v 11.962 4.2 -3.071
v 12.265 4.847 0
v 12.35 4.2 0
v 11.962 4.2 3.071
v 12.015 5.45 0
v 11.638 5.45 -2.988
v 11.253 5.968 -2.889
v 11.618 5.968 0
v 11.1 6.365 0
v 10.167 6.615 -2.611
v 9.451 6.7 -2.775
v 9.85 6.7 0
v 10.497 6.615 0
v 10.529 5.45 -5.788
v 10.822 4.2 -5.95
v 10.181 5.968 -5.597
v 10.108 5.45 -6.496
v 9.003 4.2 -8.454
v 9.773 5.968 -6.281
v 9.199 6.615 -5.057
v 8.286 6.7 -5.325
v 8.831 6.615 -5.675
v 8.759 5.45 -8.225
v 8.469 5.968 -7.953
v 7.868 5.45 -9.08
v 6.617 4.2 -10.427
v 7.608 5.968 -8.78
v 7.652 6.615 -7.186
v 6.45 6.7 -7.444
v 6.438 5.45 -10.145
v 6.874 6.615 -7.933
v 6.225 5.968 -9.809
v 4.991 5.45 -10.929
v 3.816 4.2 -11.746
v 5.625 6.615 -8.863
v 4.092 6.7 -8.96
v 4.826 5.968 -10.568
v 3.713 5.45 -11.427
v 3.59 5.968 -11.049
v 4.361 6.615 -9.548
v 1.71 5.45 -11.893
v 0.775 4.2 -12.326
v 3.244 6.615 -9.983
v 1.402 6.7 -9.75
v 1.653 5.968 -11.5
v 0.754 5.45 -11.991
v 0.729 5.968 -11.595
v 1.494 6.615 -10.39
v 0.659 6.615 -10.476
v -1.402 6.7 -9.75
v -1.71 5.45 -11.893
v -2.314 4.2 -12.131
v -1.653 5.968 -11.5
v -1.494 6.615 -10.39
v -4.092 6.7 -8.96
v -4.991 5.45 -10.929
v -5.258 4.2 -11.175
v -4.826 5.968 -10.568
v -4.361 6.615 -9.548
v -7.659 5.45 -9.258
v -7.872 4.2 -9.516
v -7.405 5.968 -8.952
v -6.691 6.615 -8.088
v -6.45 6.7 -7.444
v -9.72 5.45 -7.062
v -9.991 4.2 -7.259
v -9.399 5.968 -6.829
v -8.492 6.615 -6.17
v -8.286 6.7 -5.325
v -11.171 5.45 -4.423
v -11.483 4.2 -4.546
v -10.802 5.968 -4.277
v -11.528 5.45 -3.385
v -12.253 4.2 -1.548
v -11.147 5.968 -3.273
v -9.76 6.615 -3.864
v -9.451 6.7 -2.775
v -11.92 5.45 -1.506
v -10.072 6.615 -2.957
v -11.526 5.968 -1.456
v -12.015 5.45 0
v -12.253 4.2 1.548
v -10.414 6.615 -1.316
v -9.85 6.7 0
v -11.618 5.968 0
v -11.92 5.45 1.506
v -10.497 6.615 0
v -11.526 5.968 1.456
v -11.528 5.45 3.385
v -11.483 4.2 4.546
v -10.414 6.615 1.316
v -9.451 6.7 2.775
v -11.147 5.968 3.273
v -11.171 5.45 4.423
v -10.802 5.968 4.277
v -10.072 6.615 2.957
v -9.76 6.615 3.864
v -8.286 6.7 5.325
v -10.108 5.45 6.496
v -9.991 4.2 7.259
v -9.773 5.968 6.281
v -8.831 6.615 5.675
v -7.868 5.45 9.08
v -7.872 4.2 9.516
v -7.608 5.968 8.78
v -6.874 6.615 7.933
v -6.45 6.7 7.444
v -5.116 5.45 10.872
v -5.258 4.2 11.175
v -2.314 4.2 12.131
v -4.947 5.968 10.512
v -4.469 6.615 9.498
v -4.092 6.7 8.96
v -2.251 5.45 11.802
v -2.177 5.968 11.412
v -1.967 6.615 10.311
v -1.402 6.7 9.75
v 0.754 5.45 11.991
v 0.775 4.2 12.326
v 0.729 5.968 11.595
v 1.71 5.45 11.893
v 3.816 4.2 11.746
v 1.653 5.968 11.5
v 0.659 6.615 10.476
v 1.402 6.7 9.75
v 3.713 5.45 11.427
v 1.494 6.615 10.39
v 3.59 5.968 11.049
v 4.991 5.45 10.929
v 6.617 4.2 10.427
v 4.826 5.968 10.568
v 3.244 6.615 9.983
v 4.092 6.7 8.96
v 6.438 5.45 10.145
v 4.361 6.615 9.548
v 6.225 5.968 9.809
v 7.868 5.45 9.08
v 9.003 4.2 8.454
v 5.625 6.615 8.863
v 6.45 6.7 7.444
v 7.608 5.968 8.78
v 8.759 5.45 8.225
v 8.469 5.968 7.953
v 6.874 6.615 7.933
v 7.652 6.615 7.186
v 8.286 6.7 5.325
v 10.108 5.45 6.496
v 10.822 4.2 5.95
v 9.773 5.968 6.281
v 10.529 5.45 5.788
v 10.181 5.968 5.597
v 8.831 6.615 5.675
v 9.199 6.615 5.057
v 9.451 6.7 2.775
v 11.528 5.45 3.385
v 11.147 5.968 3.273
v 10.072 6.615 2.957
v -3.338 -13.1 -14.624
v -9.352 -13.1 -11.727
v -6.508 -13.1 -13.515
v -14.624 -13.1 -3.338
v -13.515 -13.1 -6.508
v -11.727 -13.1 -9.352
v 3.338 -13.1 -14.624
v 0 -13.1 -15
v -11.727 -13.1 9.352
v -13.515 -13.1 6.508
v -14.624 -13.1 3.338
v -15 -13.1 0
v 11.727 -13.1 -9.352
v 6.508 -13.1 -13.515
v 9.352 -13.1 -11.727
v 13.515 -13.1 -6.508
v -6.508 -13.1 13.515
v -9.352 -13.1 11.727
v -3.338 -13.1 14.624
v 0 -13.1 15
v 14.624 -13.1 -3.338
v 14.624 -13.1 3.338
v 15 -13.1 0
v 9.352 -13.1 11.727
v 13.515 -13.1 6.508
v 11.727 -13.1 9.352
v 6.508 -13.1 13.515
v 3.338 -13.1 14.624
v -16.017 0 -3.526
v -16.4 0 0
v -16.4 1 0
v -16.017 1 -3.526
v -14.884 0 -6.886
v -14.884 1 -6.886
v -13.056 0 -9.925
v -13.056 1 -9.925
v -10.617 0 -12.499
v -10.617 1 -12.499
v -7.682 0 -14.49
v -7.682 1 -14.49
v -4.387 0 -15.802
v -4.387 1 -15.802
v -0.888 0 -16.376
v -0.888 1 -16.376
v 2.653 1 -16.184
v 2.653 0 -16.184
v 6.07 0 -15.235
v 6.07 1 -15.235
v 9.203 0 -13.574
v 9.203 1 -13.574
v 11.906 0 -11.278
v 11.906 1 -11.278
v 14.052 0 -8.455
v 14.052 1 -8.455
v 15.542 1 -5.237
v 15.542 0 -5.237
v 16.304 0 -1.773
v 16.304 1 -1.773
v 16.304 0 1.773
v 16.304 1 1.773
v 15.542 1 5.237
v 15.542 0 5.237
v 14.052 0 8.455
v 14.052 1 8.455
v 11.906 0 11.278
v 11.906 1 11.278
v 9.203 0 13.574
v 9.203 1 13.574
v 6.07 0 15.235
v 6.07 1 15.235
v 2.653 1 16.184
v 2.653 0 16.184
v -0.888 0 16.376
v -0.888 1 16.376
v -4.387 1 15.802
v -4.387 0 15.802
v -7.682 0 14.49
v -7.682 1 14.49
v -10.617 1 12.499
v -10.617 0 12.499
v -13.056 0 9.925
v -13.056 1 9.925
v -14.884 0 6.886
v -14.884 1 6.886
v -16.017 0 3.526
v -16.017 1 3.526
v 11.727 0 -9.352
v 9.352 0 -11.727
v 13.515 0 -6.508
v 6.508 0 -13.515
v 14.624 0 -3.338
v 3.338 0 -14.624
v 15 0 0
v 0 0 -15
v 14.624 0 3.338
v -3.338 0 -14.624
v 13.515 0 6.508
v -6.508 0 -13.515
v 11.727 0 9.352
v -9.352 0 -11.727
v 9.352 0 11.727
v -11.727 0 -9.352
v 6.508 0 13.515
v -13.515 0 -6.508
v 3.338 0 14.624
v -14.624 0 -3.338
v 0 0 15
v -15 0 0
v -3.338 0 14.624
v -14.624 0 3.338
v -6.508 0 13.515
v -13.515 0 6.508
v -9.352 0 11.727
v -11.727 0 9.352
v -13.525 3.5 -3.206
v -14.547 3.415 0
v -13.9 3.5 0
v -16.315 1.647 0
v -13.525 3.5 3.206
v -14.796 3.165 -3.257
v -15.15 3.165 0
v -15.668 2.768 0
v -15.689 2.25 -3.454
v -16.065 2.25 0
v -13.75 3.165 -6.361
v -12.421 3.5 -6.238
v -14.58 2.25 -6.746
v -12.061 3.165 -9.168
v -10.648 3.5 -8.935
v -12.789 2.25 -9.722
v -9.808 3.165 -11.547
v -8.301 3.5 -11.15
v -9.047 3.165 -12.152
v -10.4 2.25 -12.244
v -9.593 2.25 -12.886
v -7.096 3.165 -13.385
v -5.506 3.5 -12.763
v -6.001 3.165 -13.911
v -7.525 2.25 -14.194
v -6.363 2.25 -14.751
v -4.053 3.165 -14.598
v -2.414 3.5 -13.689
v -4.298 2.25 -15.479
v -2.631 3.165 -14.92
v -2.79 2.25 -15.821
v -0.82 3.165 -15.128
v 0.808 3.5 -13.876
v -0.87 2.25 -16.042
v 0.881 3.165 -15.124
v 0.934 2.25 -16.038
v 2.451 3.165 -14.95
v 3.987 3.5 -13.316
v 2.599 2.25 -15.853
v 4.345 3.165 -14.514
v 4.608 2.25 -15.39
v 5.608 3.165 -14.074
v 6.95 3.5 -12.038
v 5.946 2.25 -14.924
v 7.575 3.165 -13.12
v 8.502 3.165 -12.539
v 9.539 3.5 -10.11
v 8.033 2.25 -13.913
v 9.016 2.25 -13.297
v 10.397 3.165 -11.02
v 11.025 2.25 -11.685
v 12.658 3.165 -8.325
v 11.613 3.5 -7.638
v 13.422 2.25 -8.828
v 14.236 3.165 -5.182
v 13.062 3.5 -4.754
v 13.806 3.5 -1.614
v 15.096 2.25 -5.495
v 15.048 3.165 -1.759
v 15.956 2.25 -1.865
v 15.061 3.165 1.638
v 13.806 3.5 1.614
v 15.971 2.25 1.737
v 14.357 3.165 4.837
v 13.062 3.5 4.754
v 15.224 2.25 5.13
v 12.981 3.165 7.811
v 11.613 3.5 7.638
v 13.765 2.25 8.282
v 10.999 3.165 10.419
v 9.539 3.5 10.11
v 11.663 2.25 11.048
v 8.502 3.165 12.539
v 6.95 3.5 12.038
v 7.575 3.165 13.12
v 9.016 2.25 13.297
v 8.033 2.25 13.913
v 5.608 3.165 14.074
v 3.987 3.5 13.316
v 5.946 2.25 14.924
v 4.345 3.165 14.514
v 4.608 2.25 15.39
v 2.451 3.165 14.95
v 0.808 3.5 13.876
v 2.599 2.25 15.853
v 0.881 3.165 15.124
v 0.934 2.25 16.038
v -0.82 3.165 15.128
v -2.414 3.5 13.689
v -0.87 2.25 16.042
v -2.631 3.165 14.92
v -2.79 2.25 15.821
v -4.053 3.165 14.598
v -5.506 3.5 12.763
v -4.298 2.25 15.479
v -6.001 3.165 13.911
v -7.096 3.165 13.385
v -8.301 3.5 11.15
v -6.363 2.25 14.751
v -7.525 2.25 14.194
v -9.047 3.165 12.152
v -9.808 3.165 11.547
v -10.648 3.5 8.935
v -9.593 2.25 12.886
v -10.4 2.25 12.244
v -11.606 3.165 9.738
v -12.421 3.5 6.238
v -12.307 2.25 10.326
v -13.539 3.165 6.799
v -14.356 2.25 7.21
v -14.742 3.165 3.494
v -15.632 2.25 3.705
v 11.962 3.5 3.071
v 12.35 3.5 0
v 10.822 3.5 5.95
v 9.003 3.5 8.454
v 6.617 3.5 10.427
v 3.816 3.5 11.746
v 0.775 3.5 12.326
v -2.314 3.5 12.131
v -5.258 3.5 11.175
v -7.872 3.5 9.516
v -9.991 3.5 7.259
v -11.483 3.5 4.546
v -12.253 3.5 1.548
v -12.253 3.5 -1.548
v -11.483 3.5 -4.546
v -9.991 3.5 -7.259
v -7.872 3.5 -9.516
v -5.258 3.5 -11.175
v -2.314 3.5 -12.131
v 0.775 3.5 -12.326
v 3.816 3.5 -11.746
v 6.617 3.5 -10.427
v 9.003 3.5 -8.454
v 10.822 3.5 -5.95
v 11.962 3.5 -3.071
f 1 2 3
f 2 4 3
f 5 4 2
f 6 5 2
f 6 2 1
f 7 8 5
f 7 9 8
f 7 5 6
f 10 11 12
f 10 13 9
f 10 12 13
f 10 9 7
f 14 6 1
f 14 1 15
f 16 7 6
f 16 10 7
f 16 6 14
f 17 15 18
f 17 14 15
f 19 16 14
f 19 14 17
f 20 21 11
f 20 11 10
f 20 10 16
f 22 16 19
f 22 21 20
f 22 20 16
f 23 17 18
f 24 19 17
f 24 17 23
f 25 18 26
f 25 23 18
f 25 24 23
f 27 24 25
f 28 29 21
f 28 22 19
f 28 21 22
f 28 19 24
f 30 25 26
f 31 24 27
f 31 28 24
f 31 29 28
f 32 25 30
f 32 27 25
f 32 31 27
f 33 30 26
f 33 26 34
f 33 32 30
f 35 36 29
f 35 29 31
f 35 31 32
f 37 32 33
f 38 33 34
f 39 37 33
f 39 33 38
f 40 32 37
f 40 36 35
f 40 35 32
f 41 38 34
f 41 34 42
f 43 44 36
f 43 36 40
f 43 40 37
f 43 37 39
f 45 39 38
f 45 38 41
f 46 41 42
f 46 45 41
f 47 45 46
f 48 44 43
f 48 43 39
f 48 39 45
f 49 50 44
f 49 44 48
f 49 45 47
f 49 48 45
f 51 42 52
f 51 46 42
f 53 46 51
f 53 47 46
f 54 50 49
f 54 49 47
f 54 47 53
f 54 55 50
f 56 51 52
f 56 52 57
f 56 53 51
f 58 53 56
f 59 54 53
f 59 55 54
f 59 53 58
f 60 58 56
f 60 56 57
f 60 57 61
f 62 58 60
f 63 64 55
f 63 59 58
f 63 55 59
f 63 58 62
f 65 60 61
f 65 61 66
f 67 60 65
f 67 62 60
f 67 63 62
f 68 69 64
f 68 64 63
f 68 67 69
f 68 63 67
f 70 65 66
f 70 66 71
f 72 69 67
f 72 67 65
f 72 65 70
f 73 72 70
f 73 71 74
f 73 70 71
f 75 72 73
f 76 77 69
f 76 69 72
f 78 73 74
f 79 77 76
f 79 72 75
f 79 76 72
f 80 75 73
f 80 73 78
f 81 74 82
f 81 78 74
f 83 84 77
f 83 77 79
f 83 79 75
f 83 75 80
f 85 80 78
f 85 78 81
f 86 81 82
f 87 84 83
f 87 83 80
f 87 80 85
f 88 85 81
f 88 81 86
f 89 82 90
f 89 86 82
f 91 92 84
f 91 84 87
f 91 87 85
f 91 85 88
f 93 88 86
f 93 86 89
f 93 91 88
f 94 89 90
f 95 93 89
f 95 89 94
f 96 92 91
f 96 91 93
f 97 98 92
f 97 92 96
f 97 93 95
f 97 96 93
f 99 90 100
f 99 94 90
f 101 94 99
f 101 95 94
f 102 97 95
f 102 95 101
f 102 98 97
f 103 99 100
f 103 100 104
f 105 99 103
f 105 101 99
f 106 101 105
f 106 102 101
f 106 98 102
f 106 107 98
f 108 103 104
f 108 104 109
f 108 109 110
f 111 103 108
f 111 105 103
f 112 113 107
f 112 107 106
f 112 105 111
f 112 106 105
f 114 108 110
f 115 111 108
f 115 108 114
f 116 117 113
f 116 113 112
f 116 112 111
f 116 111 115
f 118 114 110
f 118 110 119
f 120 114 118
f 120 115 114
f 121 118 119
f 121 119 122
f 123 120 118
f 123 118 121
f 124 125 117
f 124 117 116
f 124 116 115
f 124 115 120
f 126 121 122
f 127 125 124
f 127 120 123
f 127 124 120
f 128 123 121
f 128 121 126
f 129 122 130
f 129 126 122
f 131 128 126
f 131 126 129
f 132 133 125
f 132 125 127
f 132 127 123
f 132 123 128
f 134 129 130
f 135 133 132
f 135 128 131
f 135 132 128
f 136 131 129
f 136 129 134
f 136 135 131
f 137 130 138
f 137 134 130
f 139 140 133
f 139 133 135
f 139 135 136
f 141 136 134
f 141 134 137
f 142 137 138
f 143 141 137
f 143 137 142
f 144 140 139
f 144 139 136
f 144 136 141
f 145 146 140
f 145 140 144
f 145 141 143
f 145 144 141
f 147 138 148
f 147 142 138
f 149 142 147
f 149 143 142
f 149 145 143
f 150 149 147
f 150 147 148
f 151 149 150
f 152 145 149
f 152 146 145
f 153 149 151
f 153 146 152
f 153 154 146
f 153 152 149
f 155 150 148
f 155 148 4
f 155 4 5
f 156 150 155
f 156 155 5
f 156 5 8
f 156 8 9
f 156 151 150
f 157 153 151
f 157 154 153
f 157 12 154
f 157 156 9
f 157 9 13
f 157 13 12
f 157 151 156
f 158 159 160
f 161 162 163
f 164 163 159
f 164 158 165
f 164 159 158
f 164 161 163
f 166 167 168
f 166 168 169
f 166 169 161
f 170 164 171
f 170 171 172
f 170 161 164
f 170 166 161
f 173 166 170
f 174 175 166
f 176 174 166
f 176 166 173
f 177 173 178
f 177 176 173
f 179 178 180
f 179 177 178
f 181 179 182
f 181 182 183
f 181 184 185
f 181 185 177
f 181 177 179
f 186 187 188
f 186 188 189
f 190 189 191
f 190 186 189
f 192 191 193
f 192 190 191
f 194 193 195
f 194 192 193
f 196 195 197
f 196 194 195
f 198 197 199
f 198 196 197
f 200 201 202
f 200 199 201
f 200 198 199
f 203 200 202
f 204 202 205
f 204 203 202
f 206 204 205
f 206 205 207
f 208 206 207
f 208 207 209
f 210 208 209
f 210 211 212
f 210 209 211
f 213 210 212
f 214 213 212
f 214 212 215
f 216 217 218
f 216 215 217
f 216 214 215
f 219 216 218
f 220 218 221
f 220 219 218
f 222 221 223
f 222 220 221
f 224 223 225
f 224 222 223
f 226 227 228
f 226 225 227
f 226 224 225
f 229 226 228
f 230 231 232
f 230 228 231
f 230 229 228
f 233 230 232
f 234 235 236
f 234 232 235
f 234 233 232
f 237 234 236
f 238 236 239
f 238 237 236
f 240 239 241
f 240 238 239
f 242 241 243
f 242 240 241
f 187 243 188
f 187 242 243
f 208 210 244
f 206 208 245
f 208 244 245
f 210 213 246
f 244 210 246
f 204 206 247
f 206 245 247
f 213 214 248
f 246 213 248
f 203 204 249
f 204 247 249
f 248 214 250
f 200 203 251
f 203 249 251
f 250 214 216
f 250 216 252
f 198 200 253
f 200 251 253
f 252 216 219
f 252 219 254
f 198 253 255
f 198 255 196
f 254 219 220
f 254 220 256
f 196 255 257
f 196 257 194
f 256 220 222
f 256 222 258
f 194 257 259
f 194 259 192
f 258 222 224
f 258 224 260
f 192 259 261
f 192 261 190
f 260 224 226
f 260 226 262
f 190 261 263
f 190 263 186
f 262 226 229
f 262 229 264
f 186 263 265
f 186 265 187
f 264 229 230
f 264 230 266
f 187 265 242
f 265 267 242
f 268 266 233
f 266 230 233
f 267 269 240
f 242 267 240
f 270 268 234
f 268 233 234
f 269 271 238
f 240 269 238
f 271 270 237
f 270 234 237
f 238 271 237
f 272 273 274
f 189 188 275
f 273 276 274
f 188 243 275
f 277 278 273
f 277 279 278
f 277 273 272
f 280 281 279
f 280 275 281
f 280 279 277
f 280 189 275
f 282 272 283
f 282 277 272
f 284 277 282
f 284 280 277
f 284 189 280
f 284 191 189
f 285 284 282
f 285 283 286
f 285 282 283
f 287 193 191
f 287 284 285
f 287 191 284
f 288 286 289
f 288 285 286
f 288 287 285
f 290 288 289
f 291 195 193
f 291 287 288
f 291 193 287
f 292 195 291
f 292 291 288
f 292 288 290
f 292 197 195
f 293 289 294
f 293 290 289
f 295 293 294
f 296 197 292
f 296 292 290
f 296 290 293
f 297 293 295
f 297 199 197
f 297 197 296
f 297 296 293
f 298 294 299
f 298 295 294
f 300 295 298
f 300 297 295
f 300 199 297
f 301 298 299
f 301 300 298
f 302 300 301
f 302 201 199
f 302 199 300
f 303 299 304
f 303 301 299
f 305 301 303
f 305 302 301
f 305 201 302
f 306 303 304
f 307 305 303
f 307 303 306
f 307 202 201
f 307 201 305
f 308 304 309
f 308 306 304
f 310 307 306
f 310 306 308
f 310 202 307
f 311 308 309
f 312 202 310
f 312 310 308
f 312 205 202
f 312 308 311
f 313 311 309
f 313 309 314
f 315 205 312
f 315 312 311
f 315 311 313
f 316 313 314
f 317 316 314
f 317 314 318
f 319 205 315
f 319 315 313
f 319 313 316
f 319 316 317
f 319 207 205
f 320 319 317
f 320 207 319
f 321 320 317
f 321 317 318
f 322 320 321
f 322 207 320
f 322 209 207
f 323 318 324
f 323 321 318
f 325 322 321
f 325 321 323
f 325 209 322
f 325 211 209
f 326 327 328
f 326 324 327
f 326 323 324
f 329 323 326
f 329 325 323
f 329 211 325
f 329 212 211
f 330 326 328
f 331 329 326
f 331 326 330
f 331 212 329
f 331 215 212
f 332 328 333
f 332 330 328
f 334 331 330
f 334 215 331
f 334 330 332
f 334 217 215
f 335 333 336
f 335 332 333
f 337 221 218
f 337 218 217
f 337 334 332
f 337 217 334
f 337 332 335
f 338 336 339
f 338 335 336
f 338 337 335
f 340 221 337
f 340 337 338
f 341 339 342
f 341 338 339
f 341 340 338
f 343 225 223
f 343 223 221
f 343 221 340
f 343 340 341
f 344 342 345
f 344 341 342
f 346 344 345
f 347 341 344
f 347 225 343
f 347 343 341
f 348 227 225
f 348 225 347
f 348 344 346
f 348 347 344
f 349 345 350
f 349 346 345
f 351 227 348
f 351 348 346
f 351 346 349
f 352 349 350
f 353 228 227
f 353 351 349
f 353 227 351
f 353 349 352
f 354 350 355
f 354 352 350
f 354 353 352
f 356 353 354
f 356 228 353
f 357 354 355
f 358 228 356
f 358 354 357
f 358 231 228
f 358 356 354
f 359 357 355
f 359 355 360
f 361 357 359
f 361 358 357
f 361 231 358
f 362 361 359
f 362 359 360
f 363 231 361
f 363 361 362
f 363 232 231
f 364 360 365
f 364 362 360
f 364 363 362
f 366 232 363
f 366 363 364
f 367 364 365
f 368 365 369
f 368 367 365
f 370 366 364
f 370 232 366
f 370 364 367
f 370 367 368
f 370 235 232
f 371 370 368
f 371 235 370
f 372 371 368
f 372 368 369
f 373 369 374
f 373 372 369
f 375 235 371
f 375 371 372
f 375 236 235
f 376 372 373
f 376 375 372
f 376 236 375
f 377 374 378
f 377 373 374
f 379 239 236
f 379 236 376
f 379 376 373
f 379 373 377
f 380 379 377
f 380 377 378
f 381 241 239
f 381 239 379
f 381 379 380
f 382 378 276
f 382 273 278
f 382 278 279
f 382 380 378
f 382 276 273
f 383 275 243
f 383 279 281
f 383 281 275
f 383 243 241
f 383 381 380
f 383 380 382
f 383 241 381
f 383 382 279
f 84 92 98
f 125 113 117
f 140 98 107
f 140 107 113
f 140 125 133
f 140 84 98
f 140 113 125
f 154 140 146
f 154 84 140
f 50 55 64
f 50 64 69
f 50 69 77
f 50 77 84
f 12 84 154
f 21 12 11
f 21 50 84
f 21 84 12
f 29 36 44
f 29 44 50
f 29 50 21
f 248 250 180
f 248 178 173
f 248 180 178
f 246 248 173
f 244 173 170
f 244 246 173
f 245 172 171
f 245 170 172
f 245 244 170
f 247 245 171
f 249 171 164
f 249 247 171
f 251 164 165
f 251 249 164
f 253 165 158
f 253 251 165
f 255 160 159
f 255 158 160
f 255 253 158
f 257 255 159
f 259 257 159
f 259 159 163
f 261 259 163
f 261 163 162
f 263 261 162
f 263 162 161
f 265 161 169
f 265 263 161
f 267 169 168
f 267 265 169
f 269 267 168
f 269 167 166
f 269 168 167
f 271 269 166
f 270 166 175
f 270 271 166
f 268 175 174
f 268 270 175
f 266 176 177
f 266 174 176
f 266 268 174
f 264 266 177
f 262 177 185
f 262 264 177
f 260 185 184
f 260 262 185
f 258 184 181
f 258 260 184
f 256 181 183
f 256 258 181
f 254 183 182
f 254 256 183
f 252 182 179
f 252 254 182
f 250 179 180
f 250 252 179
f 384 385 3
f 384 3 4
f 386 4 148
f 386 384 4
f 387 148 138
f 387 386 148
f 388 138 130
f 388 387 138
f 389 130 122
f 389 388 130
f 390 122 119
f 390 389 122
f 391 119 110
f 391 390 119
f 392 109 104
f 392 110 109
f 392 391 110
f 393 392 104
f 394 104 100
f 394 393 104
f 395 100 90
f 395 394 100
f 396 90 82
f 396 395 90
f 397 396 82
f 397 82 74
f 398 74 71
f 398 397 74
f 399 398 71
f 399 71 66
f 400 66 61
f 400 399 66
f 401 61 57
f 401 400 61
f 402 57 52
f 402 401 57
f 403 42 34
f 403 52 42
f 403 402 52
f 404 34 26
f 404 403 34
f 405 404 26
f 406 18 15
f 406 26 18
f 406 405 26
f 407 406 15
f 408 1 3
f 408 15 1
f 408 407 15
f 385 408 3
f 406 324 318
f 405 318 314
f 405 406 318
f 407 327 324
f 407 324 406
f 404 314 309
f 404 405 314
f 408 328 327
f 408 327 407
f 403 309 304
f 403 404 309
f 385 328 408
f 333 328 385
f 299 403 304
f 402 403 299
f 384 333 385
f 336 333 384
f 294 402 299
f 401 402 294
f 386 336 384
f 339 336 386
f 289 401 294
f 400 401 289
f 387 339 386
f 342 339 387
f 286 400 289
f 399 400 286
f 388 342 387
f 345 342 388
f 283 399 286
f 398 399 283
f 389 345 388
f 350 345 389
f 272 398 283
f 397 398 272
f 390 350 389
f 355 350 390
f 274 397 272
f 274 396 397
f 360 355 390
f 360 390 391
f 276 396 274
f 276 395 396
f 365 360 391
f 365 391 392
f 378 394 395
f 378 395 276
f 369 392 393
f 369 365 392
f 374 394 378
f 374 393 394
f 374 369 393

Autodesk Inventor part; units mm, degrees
ref_plane "YZ Plane" through (0, 0, 0) normal (1, 0, 0) x (0, 1, 0)
ref_plane "XZ Plane" through (0, 0, 0) normal (0, 1, 0) x (-1, 0, 0)
ref_plane "XY Plane" through (0, 0, 0) normal (0, 0, 1) x (1, 0, 0)
sketch "Sketch1" plane through (0, 0, 0) normal (0, 1, 0) x (-1, 0, 0)
  circle A0 centre (0, 0) radius 16.4
  dimension "d0" = 32.8
extrude "Extrusion1" add sketch "Sketch1" along normal blind 3.5
sketch "Sketch2" plane through (0, 3.5, 0) normal (0, 1, 0) x (1, 0, 0)
  circle A0 centre (0, 0) radius 12.35
  dimension "d3" = 24.7
extrude "Extrusion2" add sketch "Sketch2" along normal blind 3.2
fillet "Fillet1" radius 2.5 1 edges at (-12.35, 6.7, 0)
fillet "Fillet2" radius 2.5 1 edges at (16.4, 3.5, 0)
sketch "Sketch3" plane through (0, 0, 0) normal (0, -1, 0) x (1, 0, 0)
  circle A0 centre (0, 0) radius 15
  dimension "d8" = 30
extrude "Extrusion3" add sketch "Sketch3" along normal blind 13.1
properties part number "Large_button"
